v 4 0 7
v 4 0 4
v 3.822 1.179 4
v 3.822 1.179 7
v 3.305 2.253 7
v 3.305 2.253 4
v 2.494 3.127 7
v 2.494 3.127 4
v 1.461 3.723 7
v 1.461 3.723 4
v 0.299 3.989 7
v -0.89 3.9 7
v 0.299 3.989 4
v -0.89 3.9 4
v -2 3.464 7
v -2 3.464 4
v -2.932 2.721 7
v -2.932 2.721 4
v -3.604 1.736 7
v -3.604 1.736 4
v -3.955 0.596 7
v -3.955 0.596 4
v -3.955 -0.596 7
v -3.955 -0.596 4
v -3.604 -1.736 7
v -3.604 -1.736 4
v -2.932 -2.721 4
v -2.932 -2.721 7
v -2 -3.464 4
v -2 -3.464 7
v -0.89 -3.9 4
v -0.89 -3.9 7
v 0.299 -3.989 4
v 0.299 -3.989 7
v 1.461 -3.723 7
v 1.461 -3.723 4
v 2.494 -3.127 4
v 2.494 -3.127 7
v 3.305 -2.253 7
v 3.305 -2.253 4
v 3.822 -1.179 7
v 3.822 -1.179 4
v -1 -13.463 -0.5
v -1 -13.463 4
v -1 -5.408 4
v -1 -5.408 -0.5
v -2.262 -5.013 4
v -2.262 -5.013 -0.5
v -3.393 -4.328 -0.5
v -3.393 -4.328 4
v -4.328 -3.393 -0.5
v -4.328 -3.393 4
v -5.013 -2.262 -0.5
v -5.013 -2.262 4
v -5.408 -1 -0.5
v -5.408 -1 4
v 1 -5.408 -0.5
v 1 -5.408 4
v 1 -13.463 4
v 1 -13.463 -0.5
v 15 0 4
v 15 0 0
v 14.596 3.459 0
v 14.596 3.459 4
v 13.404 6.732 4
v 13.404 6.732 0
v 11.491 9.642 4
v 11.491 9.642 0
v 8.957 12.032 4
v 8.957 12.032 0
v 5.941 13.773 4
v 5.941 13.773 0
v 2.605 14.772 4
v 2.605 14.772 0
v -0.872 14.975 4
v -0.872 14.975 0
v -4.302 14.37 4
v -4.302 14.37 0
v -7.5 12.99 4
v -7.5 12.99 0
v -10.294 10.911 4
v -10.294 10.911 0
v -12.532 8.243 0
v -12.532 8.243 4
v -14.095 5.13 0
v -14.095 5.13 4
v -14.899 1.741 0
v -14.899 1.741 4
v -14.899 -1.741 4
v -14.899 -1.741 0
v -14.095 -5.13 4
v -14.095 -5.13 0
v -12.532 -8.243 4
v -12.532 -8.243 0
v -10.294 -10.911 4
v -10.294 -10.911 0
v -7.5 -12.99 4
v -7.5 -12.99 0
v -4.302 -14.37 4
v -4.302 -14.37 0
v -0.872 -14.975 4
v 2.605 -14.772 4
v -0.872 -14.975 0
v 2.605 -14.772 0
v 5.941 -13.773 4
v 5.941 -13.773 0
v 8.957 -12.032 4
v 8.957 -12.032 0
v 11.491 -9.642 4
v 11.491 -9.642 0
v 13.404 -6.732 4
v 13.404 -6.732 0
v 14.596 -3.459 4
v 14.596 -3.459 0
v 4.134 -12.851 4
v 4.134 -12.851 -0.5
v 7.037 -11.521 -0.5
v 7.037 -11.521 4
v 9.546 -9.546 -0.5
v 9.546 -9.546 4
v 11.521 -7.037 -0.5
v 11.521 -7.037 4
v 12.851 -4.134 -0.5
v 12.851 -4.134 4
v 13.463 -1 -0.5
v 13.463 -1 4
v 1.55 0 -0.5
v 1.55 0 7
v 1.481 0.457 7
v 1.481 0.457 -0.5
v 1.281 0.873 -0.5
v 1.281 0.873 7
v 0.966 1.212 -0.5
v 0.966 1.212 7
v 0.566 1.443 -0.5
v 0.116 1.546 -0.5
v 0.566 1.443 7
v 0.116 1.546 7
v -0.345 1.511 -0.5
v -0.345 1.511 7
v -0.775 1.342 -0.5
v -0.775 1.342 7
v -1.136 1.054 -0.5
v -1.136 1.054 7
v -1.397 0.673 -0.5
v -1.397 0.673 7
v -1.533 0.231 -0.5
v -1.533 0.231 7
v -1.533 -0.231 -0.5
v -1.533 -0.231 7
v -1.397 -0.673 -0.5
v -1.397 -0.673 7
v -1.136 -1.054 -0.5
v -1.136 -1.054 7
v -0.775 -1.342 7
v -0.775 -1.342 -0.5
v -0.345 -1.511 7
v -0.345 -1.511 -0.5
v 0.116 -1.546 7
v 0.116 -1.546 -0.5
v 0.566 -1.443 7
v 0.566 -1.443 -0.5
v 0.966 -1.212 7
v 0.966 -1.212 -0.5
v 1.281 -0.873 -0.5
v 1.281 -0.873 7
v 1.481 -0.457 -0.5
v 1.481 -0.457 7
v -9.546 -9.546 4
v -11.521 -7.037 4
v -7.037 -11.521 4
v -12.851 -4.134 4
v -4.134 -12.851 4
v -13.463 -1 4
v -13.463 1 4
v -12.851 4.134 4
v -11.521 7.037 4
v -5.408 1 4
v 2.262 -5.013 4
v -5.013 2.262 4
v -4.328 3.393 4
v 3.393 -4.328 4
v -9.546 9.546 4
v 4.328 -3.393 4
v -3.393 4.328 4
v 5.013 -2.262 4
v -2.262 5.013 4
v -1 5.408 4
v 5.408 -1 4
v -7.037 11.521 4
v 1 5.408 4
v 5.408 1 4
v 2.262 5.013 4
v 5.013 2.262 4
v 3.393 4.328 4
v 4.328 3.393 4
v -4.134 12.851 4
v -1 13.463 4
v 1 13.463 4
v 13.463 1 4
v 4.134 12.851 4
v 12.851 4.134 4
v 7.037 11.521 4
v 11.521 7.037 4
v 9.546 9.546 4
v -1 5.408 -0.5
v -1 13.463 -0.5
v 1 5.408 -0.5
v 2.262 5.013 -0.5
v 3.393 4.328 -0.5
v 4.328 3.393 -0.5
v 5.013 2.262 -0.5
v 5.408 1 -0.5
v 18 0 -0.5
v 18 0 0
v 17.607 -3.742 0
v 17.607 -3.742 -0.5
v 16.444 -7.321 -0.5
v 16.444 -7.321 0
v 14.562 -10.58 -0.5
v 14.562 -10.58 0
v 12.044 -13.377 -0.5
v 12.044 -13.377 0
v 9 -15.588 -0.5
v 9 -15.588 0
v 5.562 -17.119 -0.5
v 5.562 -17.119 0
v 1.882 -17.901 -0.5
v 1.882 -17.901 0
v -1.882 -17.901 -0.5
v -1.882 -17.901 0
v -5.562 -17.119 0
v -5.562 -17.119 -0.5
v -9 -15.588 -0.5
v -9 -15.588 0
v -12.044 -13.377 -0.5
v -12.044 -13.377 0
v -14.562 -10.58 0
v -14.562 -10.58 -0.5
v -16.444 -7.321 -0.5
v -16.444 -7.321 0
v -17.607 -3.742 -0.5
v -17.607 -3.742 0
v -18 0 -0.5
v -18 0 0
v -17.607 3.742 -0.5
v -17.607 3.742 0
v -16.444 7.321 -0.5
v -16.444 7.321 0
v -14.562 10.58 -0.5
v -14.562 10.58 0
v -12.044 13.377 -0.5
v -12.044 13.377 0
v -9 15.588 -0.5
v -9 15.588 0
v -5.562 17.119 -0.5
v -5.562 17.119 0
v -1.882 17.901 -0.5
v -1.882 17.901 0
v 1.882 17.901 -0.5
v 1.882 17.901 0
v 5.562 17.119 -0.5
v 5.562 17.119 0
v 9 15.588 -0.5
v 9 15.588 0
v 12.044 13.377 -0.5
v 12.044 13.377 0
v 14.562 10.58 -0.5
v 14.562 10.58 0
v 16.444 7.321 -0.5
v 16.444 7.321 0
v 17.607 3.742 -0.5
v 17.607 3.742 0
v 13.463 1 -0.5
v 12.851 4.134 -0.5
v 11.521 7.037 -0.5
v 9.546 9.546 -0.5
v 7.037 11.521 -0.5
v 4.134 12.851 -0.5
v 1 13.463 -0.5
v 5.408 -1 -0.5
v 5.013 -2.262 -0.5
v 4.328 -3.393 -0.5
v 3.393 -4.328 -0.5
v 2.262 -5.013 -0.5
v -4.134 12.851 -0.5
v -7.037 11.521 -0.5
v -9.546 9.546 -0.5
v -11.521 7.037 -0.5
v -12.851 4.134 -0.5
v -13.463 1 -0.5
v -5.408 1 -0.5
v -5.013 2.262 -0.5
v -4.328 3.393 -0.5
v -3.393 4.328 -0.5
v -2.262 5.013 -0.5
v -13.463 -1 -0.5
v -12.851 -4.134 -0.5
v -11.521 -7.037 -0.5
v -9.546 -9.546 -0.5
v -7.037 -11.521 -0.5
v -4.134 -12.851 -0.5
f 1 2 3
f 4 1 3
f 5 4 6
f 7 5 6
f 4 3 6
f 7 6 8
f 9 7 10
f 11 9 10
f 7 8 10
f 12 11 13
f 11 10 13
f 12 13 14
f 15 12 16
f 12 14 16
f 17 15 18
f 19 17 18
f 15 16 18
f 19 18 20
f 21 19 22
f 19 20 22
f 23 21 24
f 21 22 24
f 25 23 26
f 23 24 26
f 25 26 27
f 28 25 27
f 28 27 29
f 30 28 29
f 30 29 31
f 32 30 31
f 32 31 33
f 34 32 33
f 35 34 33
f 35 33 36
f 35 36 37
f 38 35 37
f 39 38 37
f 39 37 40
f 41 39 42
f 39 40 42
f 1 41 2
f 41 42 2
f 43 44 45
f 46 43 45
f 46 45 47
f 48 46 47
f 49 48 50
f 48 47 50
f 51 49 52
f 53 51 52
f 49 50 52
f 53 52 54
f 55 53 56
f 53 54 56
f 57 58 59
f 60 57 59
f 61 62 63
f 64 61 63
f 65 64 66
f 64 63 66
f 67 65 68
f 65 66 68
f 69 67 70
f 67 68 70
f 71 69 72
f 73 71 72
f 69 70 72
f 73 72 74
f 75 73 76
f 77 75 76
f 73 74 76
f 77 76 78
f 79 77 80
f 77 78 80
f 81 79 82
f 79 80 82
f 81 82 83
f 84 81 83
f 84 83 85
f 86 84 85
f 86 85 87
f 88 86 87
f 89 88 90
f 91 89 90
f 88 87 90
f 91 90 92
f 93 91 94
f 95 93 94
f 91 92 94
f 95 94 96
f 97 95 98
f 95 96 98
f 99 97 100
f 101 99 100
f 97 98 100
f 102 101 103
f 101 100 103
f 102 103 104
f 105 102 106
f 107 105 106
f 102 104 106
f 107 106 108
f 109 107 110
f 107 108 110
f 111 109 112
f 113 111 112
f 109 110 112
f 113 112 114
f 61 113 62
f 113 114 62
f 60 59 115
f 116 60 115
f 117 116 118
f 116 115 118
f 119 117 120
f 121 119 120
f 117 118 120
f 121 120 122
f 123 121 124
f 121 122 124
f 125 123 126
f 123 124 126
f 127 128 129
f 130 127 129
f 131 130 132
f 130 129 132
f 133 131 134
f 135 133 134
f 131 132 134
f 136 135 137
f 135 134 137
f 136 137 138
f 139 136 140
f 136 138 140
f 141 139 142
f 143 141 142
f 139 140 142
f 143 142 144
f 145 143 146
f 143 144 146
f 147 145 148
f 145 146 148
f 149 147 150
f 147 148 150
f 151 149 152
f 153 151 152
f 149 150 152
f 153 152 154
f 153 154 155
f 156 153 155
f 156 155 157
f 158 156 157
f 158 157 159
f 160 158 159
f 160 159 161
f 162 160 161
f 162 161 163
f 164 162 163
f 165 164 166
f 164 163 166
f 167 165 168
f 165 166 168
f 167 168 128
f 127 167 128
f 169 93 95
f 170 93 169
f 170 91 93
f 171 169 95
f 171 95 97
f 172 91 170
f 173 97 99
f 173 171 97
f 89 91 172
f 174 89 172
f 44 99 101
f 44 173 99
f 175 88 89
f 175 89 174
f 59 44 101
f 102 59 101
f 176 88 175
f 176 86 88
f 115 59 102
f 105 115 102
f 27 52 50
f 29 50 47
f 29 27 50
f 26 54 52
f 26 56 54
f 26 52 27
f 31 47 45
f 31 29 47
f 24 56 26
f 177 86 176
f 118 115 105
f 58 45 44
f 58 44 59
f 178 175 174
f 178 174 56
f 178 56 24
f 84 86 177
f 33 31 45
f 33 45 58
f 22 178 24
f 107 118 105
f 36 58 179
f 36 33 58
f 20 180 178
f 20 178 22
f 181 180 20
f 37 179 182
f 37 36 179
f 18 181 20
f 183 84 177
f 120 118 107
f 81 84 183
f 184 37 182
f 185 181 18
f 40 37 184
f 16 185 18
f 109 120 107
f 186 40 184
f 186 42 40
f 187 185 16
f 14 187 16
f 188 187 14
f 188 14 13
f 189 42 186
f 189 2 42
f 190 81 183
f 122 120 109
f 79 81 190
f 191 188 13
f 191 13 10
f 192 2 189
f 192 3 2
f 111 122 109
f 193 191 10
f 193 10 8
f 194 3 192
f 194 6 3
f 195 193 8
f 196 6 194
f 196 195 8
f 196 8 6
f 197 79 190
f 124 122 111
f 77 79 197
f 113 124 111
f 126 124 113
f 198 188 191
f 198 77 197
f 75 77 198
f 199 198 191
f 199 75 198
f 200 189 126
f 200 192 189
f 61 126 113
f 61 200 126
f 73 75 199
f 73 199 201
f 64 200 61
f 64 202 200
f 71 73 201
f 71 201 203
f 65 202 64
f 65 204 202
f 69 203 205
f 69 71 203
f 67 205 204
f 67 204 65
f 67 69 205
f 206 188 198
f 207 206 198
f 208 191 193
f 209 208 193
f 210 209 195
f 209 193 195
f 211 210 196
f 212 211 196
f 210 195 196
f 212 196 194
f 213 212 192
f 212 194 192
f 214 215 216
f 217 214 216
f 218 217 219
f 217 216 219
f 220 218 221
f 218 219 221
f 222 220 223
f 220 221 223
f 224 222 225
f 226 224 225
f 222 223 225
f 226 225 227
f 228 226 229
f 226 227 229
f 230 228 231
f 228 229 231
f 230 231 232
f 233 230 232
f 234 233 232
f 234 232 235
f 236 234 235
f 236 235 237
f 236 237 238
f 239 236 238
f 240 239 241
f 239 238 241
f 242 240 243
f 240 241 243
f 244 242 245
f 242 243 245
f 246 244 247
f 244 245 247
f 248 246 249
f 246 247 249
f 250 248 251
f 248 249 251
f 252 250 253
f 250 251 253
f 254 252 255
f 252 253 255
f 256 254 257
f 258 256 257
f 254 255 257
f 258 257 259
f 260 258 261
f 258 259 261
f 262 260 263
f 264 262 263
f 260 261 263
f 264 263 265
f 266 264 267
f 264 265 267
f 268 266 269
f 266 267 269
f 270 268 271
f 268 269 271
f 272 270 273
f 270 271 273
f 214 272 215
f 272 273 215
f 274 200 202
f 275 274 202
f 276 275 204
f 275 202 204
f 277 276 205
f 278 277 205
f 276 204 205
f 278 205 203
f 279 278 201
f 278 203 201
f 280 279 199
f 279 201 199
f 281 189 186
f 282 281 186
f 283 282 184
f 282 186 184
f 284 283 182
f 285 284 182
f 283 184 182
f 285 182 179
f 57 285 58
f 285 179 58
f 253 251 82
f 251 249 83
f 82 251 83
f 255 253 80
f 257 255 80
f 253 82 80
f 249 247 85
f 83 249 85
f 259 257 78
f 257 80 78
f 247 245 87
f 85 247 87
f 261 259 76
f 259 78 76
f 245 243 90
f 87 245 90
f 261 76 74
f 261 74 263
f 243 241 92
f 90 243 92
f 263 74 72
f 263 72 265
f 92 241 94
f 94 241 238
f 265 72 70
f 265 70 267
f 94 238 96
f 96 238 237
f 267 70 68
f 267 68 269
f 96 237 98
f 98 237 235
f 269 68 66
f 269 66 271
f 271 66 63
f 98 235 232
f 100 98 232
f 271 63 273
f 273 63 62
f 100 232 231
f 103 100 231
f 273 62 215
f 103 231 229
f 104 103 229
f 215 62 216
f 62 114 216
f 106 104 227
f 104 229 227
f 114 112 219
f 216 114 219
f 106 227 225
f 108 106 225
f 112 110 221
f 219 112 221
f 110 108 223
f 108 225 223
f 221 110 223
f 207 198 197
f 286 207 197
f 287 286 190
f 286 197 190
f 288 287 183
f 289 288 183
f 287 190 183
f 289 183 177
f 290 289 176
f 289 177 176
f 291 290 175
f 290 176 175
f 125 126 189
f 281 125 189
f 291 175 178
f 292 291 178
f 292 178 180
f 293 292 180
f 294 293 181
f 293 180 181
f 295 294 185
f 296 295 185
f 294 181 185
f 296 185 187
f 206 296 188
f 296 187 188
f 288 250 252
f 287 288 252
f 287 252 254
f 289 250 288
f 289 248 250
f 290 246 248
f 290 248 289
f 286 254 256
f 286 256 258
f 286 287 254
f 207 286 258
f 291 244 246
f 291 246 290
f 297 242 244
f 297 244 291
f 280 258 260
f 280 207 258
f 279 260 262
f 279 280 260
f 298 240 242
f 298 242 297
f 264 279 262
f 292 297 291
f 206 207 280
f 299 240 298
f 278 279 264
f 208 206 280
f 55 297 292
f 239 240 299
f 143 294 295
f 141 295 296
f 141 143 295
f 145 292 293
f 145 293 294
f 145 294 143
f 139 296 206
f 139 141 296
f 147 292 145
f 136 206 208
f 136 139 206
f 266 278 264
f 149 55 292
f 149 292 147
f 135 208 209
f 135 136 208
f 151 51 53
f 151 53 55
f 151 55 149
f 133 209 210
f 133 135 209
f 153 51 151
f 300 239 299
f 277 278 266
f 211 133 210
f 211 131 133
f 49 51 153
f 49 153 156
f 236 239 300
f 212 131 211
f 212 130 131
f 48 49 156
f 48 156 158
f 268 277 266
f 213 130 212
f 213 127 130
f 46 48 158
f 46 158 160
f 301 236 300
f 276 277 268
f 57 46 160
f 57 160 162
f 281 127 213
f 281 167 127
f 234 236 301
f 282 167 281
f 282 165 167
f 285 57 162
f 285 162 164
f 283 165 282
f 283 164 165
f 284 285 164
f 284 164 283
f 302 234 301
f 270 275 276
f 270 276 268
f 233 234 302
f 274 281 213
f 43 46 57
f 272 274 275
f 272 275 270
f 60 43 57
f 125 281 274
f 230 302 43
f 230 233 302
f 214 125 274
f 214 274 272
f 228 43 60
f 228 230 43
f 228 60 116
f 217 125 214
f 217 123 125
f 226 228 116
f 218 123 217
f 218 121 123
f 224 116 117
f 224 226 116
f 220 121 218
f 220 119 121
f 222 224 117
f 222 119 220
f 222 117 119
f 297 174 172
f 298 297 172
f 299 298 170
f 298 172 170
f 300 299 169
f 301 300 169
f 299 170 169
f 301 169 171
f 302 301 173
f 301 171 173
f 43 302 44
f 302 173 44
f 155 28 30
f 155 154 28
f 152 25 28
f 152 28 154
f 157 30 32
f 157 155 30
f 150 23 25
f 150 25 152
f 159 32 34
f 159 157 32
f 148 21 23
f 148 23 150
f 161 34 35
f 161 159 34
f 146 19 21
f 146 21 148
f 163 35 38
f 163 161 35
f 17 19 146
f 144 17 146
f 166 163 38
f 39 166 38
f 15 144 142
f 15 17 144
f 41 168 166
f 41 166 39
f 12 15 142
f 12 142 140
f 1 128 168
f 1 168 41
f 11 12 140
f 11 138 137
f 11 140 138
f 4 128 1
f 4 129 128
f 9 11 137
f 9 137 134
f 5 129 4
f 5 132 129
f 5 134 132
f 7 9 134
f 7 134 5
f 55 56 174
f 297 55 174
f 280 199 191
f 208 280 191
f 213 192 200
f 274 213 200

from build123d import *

# Parameters (mm, degrees)
F0_R     = 15
F1_DEPTH = 4
F2_R     = 18
F2_R_2   = 15
F3_DEPTH = 0.5
F4_R     = 4
F5_DEPTH = 3
F6_R     = 1.55
F7_DEPTH = 7.5
F9_DEPTH = 4.5


with BuildPart() as f1:
    # F0 (on Top) → F1 (new body)
    with BuildSketch(Plane.XY):
        Circle(F0_R)
    extrude(amount=F1_DEPTH)

    # F2 (on face) → F3 (join)
    with BuildSketch(Plane(origin=(0, 0, 0), x_dir=(1, 0, 0), z_dir=(0, 0, -1))):
        Circle(F2_R)
        Circle(F2_R_2, mode=Mode.SUBTRACT)
        Circle(F2_R_2)
    extrude(amount=F3_DEPTH)

    # F4 (on face) → F5 (join)
    with BuildSketch(Plane.XY.offset(4)):
        Circle(F4_R)
    extrude(amount=F5_DEPTH)

    # F6 (on face) → F7 (cut, through all)
    with BuildSketch(Plane.XY.offset(7)):
        Circle(F6_R)
    extrude(amount=-F7_DEPTH, mode=Mode.SUBTRACT)

    # F8 (on face) → F9 (cut, through all)
    with BuildSketch(Plane.XY.offset(4)):
        with BuildLine():
            ThreePointArc((-5.4083269132, 1), (-3.8890872965, 3.8890872965), (-1, 5.4083269132))
            Line((-1, 5.4083269132), (-1, 13.4629120178))
            ThreePointArc((-1, 13.4629120178), (-9.545941546, 9.545941546), (-13.4629120178, 1))
            Line((-13.4629120178, 1), (-5.4083269132, 1))
        make_face()
        with BuildLine():
            Line((1, 13.4629120178), (1, 5.4083269132))
            ThreePointArc((1, 5.4083269132), (3.8890872965, 3.8890872965), (5.4083269132, 1))
            Line((5.4083269132, 1), (13.4629120178, 1))
            ThreePointArc((13.4629120178, 1), (9.545941546, 9.545941546), (1, 13.4629120178))
        make_face()
        with BuildLine():
            Line((13.4629120178, -1), (5.4083269132, -1))
            ThreePointArc((5.4083269132, -1), (3.8890872965, -3.8890872965), (1, -5.4083269132))
            Line((1, -5.4083269132), (1, -13.4629120178))
            ThreePointArc((1, -13.4629120178), (9.545941546, -9.545941546), (13.4629120178, -1))
        make_face()
        with BuildLine():
            ThreePointArc((-1, -5.4083269132), (-3.8890872965, -3.8890872965), (-5.4083269132, -1))
            Line((-5.4083269132, -1), (-13.4629120178, -1))
            ThreePointArc((-13.4629120178, -1), (-9.545941546, -9.545941546), (-1, -13.4629120178))
            Line((-1, -13.4629120178), (-1, -5.4083269132))
        make_face()
    extrude(amount=-F9_DEPTH, mode=Mode.SUBTRACT)


solid = f1.part
